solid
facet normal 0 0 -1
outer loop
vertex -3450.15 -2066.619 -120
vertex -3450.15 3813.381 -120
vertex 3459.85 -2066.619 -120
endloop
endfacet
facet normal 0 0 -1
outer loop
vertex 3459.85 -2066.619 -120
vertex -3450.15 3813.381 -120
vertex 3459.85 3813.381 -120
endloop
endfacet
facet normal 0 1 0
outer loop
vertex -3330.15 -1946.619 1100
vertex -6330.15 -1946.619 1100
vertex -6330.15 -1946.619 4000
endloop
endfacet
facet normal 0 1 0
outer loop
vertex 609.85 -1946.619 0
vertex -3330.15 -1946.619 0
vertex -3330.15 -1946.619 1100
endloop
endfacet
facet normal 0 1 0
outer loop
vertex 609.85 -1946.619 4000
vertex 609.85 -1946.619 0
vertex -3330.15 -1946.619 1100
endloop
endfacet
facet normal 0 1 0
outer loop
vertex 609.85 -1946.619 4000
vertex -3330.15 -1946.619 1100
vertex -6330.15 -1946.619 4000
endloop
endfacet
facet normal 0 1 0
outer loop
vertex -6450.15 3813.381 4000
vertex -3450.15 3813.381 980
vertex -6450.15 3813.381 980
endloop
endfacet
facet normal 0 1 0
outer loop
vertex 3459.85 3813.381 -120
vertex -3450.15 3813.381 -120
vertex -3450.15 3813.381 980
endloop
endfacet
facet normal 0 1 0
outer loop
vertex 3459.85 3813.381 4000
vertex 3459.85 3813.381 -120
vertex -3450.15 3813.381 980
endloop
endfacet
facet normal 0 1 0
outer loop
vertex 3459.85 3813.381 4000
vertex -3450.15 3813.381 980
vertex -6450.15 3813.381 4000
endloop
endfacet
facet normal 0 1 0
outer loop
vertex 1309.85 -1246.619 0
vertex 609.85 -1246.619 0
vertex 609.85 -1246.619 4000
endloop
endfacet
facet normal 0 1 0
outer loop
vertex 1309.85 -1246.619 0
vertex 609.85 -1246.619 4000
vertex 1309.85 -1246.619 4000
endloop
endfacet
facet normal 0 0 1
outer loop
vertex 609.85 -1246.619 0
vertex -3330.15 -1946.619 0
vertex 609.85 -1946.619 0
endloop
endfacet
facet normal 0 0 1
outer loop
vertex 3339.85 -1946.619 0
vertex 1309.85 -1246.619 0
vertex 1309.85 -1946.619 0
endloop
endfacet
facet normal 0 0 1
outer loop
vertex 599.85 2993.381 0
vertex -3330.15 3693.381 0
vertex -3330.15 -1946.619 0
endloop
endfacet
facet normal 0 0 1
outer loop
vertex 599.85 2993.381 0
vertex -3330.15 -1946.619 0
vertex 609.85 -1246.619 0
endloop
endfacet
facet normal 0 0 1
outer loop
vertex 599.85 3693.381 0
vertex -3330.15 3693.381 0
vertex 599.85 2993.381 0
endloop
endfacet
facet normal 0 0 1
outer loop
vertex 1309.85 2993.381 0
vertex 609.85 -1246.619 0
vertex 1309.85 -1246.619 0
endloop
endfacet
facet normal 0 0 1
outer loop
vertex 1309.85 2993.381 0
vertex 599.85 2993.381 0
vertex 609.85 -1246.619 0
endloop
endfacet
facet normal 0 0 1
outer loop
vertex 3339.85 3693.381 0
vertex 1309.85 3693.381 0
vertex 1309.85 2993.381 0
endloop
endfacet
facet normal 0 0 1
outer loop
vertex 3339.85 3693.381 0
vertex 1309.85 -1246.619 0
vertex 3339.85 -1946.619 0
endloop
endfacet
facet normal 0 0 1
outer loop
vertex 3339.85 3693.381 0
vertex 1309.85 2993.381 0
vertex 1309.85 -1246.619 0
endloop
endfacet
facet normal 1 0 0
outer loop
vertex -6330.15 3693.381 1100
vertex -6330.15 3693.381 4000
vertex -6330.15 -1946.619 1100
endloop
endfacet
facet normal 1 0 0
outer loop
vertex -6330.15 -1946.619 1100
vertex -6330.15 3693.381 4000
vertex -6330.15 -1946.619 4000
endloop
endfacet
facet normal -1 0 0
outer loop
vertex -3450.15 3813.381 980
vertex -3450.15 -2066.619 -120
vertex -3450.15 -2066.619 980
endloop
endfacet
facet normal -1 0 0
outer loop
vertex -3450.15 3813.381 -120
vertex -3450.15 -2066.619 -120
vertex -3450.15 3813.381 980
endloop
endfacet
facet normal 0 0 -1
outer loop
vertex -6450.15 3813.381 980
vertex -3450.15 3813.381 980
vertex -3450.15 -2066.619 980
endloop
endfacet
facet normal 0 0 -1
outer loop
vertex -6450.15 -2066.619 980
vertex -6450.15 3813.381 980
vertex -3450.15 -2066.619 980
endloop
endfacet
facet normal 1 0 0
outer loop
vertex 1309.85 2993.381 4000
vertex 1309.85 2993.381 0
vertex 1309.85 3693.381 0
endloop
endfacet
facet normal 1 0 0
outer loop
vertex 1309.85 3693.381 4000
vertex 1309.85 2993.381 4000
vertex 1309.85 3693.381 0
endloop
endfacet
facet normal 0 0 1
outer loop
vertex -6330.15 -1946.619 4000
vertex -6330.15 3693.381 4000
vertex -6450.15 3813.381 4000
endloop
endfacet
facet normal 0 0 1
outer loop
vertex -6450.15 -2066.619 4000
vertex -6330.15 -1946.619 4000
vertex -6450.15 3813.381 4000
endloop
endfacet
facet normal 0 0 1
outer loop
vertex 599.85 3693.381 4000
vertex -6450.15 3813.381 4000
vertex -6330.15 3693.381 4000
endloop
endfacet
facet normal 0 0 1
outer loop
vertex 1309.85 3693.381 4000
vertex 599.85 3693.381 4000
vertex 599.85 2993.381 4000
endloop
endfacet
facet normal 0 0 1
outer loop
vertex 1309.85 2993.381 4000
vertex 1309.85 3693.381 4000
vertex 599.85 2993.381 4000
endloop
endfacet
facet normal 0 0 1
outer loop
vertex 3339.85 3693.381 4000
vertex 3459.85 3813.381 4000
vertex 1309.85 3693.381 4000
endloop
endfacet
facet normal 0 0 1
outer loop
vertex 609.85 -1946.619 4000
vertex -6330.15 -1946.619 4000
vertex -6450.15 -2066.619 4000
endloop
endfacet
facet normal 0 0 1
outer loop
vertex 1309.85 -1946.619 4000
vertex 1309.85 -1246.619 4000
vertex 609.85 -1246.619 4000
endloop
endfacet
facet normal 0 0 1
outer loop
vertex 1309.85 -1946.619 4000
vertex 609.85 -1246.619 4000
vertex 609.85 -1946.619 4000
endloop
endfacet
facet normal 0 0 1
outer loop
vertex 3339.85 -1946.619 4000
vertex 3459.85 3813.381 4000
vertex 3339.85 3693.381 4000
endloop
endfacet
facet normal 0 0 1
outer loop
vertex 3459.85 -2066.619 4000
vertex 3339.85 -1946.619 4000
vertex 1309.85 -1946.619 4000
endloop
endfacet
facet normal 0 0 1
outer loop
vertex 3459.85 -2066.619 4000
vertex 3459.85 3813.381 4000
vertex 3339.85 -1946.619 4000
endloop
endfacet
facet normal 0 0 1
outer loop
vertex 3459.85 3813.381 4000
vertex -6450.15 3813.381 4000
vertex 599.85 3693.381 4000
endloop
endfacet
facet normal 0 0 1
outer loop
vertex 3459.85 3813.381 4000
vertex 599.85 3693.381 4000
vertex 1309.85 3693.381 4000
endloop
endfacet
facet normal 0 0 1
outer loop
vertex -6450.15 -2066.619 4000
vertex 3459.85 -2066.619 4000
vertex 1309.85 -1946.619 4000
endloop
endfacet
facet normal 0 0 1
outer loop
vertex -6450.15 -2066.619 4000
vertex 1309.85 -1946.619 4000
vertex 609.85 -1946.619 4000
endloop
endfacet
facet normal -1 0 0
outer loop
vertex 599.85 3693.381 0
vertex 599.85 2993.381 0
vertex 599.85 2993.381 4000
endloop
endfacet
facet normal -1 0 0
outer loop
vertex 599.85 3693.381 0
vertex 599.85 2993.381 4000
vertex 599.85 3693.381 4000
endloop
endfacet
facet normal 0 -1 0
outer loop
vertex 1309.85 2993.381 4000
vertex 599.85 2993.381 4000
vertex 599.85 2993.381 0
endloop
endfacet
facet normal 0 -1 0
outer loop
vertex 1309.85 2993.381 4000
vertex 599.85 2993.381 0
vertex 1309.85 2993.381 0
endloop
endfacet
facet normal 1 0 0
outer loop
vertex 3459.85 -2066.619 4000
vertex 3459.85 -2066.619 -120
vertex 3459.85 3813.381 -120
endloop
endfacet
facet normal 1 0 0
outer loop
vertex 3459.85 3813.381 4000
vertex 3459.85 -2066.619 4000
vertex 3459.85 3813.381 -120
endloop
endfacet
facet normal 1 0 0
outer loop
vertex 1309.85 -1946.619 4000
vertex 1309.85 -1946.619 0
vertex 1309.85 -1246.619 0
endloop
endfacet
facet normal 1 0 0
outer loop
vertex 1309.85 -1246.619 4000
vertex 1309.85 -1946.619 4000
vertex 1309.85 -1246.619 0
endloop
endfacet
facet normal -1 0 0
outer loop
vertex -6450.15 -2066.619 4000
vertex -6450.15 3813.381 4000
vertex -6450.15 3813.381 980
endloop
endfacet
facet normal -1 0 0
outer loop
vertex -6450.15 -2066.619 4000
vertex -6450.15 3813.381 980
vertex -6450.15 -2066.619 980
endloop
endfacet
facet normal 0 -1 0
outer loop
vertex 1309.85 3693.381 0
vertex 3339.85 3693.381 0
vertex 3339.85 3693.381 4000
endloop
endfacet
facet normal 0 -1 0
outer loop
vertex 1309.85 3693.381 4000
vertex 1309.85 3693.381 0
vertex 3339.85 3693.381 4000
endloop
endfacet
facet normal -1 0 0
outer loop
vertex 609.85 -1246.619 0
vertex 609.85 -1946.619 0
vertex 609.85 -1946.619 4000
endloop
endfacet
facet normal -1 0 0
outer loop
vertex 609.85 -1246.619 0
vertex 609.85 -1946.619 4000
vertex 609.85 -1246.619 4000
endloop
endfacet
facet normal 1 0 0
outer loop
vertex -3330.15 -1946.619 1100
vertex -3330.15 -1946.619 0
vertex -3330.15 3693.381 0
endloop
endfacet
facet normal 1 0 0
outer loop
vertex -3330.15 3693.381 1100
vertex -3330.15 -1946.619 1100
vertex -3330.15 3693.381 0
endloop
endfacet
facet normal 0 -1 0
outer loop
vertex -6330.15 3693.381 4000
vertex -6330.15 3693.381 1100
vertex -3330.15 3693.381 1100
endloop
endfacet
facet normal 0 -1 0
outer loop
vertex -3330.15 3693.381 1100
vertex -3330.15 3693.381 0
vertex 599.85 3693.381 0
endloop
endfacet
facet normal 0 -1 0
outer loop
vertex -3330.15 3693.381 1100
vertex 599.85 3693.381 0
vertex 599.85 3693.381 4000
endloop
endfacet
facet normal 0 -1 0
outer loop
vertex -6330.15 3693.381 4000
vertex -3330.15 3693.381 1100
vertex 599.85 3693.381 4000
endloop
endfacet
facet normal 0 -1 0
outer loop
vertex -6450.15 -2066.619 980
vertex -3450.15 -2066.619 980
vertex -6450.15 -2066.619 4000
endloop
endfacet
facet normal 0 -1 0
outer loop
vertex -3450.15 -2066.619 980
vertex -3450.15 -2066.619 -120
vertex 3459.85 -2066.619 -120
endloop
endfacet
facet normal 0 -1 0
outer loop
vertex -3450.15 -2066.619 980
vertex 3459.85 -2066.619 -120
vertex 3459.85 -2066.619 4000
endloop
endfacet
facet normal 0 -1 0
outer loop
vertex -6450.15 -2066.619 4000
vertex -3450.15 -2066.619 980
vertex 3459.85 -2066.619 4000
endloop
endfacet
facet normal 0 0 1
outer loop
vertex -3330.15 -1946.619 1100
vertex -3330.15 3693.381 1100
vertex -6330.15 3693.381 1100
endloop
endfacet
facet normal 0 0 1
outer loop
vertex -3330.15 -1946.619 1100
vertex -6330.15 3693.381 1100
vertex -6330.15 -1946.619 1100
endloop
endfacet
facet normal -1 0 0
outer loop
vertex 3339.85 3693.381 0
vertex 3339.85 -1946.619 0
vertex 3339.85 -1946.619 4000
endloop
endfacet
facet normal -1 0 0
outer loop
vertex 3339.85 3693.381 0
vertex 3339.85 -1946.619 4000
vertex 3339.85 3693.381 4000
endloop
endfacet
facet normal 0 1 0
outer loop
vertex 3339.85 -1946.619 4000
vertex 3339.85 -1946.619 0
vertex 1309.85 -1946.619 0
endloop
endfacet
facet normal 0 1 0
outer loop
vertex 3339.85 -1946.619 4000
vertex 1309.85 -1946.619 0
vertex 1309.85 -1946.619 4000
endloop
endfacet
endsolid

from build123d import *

# Parameters (mm, degrees)
F0_W     = 6670
F0_H     = 5640
F1_DEPTH = 4000
F2_W     = 5640
F2_H     = 2900
F3_DEPTH = 3000
F4_T     = 120
F5_W     = 700
F5_H     = 700
F5_W_2   = 710
F6_DEPTH = 4000


with BuildPart() as f1:
    # F0 (on Top) → F1 (new body)
    with BuildSketch(Plane.XY):
        with Locations((4.8496238887, 873.3809552149)):
            Rectangle(F0_W, F0_H)
    extrude(amount=F1_DEPTH)

    # F2 (on face) → F3 (join)
    with BuildSketch(Plane(origin=(-3330.1503761113, 0, 0), x_dir=(0, -1, 0), z_dir=(-1, 0, 0))):
        with Locations((-873.3809552149, 2550)):
            Rectangle(F2_W, F2_H)
    extrude(amount=F3_DEPTH)

    # F4
    f4_openings = [f1.faces().sort_by_distance(p)[0] for p in [
        (-1495.150376, 873.380955, 4000),
    ]]
    offset(amount=F4_T, openings=f4_openings, kind=Kind.INTERSECTION)

    # F5 (on face) → F6 (join, through all)
    with BuildSketch(Plane.XY):
        with Locations((959.8496238887, -1596.6190447851)):
            Rectangle(F5_W, F5_H)
        with Locations((954.8496238887, 3343.3809552149)):
            Rectangle(F5_W_2, F5_H)
    extrude(amount=F6_DEPTH)


solid = f1.part
